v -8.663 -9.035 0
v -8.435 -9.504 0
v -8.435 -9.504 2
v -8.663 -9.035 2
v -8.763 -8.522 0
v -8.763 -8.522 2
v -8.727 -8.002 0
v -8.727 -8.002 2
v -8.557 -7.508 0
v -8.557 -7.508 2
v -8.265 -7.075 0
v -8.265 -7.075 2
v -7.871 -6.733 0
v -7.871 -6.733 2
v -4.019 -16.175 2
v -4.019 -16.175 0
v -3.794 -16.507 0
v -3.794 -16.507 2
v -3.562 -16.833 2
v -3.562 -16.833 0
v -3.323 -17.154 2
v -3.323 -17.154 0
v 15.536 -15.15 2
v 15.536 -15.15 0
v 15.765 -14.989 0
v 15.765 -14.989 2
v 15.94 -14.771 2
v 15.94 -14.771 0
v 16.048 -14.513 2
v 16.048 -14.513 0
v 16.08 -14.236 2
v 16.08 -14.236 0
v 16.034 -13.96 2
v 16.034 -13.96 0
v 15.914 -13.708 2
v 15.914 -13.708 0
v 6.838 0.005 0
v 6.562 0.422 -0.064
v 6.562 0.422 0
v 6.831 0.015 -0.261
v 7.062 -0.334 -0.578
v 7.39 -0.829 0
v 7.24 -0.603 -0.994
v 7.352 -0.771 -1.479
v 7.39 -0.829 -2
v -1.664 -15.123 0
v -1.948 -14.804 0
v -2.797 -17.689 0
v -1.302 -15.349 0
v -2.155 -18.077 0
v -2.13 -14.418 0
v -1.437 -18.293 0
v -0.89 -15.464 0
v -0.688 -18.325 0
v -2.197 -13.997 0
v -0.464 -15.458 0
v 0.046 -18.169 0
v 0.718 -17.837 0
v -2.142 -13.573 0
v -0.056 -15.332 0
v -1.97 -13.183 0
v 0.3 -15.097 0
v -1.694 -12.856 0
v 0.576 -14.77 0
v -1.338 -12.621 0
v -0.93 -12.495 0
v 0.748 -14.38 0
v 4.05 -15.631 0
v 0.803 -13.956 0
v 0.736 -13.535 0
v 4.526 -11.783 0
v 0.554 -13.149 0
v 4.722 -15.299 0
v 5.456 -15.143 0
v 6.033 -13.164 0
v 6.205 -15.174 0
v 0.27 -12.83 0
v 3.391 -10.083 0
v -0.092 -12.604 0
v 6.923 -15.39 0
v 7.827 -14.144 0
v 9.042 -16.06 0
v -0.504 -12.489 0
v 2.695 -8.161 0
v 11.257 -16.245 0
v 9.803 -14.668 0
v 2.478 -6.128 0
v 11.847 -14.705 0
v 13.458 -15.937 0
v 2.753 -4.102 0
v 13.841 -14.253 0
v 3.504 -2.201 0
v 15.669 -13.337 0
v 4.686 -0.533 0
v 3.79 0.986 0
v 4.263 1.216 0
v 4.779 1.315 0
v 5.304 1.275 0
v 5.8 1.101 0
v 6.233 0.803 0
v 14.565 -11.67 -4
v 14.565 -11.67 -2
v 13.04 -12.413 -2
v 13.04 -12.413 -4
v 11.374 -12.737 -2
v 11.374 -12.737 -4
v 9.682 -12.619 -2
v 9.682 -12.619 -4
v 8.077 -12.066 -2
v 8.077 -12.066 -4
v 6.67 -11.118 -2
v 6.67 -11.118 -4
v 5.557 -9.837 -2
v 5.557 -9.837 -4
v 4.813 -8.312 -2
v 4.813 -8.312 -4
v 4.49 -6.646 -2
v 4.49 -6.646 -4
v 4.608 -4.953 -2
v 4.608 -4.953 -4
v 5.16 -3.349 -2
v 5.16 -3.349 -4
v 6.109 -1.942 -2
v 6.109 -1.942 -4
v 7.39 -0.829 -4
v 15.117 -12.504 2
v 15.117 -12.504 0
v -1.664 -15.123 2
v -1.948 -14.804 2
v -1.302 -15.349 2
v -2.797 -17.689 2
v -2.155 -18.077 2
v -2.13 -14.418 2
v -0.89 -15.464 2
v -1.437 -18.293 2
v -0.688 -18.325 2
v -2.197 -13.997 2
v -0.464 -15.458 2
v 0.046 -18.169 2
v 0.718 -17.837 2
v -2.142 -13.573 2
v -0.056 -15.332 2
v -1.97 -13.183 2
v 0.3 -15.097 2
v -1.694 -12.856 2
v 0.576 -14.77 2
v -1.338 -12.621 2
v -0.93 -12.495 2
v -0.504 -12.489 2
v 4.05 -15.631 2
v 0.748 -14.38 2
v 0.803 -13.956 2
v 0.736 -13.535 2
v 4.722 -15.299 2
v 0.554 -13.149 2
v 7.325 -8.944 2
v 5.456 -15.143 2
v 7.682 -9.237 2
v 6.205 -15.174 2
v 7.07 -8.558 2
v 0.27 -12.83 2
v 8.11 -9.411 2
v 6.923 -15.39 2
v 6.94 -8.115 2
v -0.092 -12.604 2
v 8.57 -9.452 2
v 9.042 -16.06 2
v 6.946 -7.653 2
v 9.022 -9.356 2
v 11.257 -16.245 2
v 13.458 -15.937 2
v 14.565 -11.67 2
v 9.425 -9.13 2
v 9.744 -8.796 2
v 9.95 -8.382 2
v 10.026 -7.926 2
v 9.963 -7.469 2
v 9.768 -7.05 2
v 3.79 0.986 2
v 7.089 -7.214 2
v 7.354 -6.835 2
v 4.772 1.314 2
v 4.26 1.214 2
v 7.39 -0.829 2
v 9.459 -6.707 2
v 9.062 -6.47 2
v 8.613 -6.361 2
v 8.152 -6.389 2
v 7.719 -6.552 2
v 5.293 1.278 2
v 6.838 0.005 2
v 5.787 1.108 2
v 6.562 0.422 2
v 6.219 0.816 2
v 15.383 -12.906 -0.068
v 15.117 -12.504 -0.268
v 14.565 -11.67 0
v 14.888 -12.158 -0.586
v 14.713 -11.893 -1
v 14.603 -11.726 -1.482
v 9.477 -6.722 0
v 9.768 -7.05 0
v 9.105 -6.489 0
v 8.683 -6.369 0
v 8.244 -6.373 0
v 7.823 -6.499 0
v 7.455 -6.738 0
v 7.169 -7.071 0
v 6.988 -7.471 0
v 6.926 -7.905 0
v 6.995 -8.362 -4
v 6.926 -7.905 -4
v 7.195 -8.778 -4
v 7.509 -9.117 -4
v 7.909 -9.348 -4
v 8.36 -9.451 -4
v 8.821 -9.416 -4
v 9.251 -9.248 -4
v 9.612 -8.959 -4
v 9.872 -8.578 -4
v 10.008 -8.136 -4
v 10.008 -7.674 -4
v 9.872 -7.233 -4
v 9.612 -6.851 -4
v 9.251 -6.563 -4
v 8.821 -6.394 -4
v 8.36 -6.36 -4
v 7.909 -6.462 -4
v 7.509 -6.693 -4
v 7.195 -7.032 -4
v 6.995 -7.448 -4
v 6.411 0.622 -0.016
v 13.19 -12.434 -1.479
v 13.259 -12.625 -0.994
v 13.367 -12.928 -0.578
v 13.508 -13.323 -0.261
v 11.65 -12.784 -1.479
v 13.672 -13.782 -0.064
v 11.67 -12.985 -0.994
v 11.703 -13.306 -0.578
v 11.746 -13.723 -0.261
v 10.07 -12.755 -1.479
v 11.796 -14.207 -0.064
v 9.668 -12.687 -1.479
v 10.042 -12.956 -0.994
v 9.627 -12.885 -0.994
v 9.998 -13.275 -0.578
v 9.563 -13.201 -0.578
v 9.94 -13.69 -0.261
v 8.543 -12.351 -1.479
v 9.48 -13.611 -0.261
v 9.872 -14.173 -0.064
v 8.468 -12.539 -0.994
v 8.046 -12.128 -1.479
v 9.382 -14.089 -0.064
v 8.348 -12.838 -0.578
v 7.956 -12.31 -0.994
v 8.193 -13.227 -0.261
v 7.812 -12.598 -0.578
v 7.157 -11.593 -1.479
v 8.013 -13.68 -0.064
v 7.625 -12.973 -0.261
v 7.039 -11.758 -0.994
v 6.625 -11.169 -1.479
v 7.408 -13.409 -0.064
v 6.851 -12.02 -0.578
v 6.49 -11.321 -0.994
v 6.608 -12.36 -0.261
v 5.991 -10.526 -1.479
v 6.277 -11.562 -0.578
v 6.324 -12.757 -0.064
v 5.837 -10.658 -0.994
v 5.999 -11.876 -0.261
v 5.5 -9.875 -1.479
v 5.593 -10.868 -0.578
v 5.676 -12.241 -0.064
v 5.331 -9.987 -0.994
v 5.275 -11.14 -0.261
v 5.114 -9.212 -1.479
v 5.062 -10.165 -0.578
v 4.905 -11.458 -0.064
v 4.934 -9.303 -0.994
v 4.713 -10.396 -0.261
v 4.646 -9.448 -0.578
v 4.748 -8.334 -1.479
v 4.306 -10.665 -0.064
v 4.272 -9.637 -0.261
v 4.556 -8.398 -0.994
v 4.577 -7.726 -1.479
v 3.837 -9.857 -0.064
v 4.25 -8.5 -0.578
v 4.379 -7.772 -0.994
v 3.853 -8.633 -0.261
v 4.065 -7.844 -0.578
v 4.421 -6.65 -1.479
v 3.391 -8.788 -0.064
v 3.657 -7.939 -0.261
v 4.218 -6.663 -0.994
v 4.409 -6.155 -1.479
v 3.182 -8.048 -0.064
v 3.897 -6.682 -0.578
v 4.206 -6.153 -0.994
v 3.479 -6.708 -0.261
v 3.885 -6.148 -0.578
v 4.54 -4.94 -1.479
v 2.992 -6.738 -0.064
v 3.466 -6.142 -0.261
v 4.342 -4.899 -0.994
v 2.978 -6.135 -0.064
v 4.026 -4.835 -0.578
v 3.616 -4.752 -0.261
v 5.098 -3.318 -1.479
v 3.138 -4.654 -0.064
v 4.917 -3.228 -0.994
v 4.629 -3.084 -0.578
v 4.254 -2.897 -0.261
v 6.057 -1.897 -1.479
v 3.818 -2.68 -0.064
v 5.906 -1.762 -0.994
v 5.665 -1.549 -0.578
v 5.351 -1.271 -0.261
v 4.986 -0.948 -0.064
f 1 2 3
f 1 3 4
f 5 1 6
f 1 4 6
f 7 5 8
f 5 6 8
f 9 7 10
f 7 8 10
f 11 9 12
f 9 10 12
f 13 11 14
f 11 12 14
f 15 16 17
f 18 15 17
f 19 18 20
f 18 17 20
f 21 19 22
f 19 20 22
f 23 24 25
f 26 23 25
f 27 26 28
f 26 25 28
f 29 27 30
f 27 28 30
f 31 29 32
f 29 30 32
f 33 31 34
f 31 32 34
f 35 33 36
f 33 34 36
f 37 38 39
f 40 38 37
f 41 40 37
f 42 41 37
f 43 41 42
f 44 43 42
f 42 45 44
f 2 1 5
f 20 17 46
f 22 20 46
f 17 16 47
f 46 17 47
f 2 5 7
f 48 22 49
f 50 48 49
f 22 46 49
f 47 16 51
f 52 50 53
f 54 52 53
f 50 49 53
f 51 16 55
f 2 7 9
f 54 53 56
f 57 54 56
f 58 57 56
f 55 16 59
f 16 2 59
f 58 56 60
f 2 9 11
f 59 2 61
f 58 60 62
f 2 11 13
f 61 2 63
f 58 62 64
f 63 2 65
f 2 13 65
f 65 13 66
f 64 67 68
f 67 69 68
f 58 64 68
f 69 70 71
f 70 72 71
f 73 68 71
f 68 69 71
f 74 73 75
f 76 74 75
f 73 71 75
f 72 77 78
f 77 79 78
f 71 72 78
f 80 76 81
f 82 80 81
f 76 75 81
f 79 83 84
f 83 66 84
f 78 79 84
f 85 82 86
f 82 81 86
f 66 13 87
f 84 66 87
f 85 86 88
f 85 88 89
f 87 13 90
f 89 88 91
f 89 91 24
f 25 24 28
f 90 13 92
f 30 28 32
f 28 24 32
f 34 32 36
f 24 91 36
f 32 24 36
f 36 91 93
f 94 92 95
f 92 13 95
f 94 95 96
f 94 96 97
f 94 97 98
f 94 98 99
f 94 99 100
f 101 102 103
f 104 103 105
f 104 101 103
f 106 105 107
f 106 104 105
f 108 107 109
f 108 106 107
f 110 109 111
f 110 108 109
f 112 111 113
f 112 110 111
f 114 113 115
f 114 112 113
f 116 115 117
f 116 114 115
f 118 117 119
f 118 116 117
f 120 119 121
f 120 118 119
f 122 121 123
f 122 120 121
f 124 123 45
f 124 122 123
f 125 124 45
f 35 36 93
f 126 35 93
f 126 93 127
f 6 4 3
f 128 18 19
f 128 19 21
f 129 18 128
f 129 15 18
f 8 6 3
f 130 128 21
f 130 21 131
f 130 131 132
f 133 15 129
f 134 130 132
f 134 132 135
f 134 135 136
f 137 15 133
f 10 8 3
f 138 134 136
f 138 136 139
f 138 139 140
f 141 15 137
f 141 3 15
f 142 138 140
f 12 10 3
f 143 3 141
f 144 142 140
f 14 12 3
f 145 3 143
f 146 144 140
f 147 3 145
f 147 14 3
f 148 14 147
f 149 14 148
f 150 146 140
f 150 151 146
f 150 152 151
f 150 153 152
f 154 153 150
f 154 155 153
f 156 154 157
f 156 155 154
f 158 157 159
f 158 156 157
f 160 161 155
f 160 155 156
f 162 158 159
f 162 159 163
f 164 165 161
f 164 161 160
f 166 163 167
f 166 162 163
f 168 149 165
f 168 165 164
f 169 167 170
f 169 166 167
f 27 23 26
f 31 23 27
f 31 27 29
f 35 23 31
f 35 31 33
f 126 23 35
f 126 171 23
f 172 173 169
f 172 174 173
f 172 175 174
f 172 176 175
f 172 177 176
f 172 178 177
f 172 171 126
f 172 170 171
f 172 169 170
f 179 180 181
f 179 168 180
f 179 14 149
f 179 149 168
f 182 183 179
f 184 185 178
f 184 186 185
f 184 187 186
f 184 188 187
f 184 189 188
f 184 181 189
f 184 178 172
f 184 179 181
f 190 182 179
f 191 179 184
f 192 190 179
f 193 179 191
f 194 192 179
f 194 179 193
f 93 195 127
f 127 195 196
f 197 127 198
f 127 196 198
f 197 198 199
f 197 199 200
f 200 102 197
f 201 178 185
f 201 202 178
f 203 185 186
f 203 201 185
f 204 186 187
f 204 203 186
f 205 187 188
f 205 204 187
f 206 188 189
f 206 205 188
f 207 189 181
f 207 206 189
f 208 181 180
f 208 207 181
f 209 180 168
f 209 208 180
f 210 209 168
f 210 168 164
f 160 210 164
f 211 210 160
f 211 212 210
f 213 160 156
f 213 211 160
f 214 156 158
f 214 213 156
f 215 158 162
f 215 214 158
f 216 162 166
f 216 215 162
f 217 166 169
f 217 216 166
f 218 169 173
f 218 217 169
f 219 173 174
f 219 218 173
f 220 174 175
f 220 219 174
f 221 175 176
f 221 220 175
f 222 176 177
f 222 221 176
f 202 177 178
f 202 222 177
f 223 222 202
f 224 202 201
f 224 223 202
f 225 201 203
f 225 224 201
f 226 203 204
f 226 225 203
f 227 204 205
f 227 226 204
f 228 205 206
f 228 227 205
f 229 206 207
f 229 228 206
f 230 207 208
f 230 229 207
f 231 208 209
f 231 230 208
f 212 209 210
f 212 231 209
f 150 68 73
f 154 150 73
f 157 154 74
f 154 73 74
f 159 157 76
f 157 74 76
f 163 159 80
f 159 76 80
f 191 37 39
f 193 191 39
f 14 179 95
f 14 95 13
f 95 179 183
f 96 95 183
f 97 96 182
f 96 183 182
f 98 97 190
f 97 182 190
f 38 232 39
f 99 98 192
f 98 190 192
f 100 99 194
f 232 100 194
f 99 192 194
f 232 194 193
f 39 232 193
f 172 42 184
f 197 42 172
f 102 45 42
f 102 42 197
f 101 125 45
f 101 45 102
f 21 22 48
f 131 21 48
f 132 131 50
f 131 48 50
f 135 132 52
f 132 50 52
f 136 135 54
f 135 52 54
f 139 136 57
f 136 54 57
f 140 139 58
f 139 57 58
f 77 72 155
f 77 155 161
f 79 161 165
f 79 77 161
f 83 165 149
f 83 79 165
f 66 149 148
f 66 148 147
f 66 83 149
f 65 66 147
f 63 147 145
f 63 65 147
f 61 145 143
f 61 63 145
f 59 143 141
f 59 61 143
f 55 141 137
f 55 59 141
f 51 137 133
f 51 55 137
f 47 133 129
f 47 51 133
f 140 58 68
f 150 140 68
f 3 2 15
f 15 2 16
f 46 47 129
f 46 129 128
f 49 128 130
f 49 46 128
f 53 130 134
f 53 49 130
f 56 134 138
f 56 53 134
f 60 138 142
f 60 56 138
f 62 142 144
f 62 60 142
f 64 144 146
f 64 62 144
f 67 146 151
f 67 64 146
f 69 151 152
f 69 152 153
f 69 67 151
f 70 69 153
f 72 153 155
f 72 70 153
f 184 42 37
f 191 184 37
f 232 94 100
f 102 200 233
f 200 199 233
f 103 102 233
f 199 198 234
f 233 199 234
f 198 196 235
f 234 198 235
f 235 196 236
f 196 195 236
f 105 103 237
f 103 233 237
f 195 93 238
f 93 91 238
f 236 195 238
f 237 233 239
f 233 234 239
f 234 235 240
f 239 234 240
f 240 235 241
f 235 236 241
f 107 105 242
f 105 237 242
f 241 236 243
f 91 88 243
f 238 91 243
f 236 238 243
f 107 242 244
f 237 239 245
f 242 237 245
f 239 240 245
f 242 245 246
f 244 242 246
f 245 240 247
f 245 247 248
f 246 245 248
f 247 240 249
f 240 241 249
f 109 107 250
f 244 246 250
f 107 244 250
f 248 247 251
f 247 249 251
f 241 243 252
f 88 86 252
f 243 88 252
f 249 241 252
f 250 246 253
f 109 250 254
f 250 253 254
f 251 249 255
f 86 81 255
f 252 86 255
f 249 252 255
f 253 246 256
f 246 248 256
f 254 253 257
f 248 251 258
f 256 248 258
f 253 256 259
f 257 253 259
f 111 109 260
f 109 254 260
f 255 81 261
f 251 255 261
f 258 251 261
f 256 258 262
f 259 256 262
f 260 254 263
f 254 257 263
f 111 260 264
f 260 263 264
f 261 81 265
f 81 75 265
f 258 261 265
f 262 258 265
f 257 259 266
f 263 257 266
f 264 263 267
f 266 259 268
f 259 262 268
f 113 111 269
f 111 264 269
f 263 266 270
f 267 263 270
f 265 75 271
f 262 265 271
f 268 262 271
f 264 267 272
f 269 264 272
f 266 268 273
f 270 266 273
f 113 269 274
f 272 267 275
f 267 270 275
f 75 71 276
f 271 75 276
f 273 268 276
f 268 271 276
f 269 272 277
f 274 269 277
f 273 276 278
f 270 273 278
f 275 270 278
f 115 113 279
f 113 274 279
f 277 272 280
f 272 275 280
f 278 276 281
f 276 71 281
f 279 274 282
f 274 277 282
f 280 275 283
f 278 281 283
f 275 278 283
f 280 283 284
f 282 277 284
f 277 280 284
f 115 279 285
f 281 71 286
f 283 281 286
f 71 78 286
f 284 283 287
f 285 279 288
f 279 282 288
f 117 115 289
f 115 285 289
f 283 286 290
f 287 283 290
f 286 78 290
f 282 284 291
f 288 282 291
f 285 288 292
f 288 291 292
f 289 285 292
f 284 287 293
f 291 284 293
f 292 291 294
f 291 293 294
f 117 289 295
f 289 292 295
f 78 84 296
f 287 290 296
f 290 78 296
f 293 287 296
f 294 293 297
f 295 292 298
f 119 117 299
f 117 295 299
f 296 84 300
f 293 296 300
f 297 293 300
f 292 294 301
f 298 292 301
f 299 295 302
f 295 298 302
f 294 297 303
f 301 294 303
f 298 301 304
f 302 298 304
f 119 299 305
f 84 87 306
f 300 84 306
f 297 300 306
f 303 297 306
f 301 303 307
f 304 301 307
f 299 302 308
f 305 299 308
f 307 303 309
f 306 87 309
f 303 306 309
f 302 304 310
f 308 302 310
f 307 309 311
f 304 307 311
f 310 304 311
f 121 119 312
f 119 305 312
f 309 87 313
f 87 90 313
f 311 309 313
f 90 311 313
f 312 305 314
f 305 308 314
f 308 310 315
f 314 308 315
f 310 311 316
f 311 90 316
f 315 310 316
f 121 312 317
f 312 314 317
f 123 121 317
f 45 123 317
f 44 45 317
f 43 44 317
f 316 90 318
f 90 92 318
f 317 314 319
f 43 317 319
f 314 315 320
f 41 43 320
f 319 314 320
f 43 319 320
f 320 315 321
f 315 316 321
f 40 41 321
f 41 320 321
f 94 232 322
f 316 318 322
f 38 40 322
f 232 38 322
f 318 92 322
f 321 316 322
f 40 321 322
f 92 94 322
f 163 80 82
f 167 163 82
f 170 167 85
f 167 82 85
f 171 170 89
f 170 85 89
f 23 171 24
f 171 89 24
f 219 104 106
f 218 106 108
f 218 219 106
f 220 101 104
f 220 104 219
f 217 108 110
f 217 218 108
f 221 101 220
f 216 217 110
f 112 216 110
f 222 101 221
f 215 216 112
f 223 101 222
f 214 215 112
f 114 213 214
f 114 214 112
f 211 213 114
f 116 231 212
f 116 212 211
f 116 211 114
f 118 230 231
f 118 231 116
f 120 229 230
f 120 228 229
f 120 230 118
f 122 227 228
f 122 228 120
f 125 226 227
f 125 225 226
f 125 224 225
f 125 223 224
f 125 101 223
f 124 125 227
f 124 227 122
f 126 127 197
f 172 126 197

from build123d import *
from build123d.topology import SkipClean

# Parameters (mm, degrees)
EXTRUDE_1_DEPTH     = 2
EXTRUDE_START       = 4
SKETCH_3_R          = 1.55
EXTRUDE_2_DEPTH     = 4
FILLET_1_R          = 2
CUT_EXTRUDE_1_DEPTH = 10
FILLET_2_R          = 2


with BuildPart() as part:
    # 草图2 → 凸台-拉伸1 (new body)
    with BuildSketch(Plane.XY):
        with BuildLine():
            Line((14.564994601, -11.669618141), (7.389813792, -0.829102454))
            Line((7.389813792, -0.829102454), (6.837876806, 0.004783368))
            Line((6.837876806, 0.004783368), (4.07819188, 4.174212479))
            Line((4.07819188, 4.174212479), (3.526254895, 5.008098301))
            Line((3.526254895, 5.008098301), (-3.648925914, 15.848613988))
            Line((-3.648925914, 15.848613988), (-4.2008629, 16.68249981))
            Line((-4.2008629, 16.68249981), (-4.998009984, 17.886857679))
            ThreePointArc((-4.998009984, 17.886857679), (-5.687361464, 18.324420478), (-6.473069172, 18.102316754))
            ThreePointArc((-6.473069172, 18.102316754), (-9.153711125, 14.591132343), (-10.06004351, 10.267613076))
            ThreePointArc((-10.06004351, 10.267613076), (-10.405656258, 8.820717267), (-11.403844954, 7.717732689))
            Line((-11.403844954, 7.717732689), (-14.736003804, 5.512224858))
            ThreePointArc((-14.736003804, 5.512224858), (-15.998358454, 3.706490878), (-15.686779581, 1.525405581))
            ThreePointArc((-15.686779581, 1.525405581), (-15.380816242, 1.008667124), (-15.057770631, 0.502432268))
            Line((-15.057770631, 0.502432268), (-4.019030925, -16.175284173))
            ThreePointArc((-4.019030925, -16.175284173), (-3.679263259, -16.670450943), (-3.323152402, -17.153997481))
            ThreePointArc((-3.323152402, -17.153997481), (-1.437196365, -18.293025266), (0.718231785, -17.83657816))
            Line((0.718231785, -17.83657816), (4.050390635, -15.631070329))
            ThreePointArc((4.050390635, -15.631070329), (5.455716688, -15.143203199), (6.922632961, -15.390412219))
            ThreePointArc((6.922632961, -15.390412219), (11.256585707, -16.245462422), (15.536058254, -15.149847541))
            ThreePointArc((15.536058254, -15.149847541), (16.047506269, -14.513382621), (15.91407867, -13.707861832))
            Line((15.91407867, -13.707861832), (15.116931586, -12.503503963))
            Line((15.116931586, -12.503503963), (14.564994601, -11.669618141))
        make_face()
        with BuildLine():
            ThreePointArc((-1.270469952, 9.628047515), (-3.418495303, 10.065068212), (-3.855516, 7.917042861))
            ThreePointArc((-3.855516, 7.917042861), (-1.707490649, 7.480022164), (-1.270469952, 9.628047515))
        make_face(mode=Mode.SUBTRACT)
        with BuildLine():
            ThreePointArc((7.183223706, -8.76067358), (9.331249057, -9.197694277), (9.768269754, -7.049668926))
            ThreePointArc((9.768269754, -7.049668926), (7.620244403, -6.612648229), (7.183223706, -8.76067358))
        make_face(mode=Mode.SUBTRACT)
        with BuildLine():
            ThreePointArc((-1.947826046, -14.804383569), (0.130908165, -15.227306825), (0.55383142, -13.148572614))
            ThreePointArc((0.55383142, -13.148572614), (-1.524902791, -12.725649358), (-1.947826046, -14.804383569))
        make_face(mode=Mode.SUBTRACT)
        with BuildLine():
            ThreePointArc((-10.484908286, 3.529143828), (-12.563642497, 3.952067083), (-12.986565752, 1.873332872))
            ThreePointArc((-12.986565752, 1.873332872), (-10.907831541, 1.450409617), (-10.484908286, 3.529143828))
        make_face(mode=Mode.SUBTRACT)
    extrude(amount=EXTRUDE_1_DEPTH)

    # 草图3 → 凸台-拉伸2 (add)
    # profile 1 of 2: a face of its own
    with SkipClean():  # the faces are left unmerged after this step: merging them gives an invalid solid
        with BuildSketch(Plane(origin=(0, 0, 0), x_dir=(-1, 0, 0), z_dir=(0, 0, -1)).offset(EXTRUDE_START)):
            with BuildLine():
                ThreePointArc((-3.526254895, 5.008098301), (5.481593353, 6.84076574), (3.648925914, 15.848613988))
                Line((3.648925914, 15.848613988), (-3.526254895, 5.008098301))
            make_face()
            with Locations((2.562992976, 8.772545188)):
                Circle(SKETCH_3_R, mode=Mode.SUBTRACT)
        # profile 2 of 2: a face of its own
        with BuildSketch(Plane(origin=(0, 0, 0), x_dir=(-1, 0, 0), z_dir=(0, 0, -1)).offset(EXTRUDE_START)):
            with BuildLine():
                ThreePointArc((-14.564994601, -11.669618141), (-5.557146353, -9.836950702), (-7.389813792, -0.829102454))
                Line((-7.389813792, -0.829102454), (-14.564994601, -11.669618141))
            make_face()
            with Locations((-8.47574673, -7.905171253)):
                Circle(SKETCH_3_R, mode=Mode.SUBTRACT)
        extrude(amount=-EXTRUDE_2_DEPTH)

    # 圆角1
    # the kernel refuses this fillet: 2 mm, written as the material it adds along each edge
    with BuildSketch(Plane(origin=(10.977404196, -6.249360297, 0), x_dir=(0.5519369853128372, -0.8338858220666526, 0), z_dir=(0.8338858220666526, 0.5519369853128372, 0))) as fillet_1_piece_1:
        with BuildLine():
            CenterArc((6.5 + FILLET_1_R, FILLET_1_R), FILLET_1_R, 180, 90)
            Line((6.5, FILLET_1_R), (6.5, 0))
            Line((6.5, 0), (6.5 + FILLET_1_R, 0))
        make_face()
    revolve(axis=Axis((10.977404196, -6.249360297, 0), (0, 0, -1)), revolution_arc=180)
    with BuildSketch(Plane(origin=(-0.06133551, 10.428356144, 0), x_dir=(0.5519369853122391, -0.8338858220670484, 0), z_dir=(0.8338858220670484, 0.5519369853122391, 0))) as fillet_1_piece_2:
        with BuildLine():
            CenterArc((6.5 + FILLET_1_R, FILLET_1_R), FILLET_1_R, 180, 90)
            Line((6.5, FILLET_1_R), (6.5, 0))
            Line((6.5, 0), (6.5 + FILLET_1_R, 0))
        make_face()
    revolve(axis=Axis((-0.06133551, 10.428356144, 0), (0, 0, -1)), revolution_arc=180)

    # 草图4 → 切除-拉伸1 (cut)
    with BuildSketch(Plane.XY.offset(2)):
        Polygon((5.458034343, 2.089497924), (-9.538400778, -7.836425953), (-26.545257477, 2.73324315), (-0.393587014, 27.879080134), align=None)
    extrude(amount=-CUT_EXTRUDE_1_DEPTH, mode=Mode.SUBTRACT)

    # 圆角2
    # the kernel refuses this fillet: 2 mm, written as the material it takes off along each edge
    with BuildSketch(Plane(origin=(5.458034343, 2.089497924, 7), x_dir=(-0.8338858220669847, -0.5519369853123355, 0), z_dir=(0, 0, -1))) as fillet_2_piece_1:
        with BuildLine():
            CenterArc((FILLET_2_R, -FILLET_2_R), FILLET_2_R, 90, 90)
            Line((0, -FILLET_2_R), (0, 0))
            Line((0, 0), (FILLET_2_R, 0))
        make_face()
    extrude(amount=12, mode=Mode.SUBTRACT)
    with BuildSketch(Plane(origin=(-9.538400778, -7.836425953, 7), x_dir=(0.8338858220669851, 0.5519369853123349, 0), z_dir=(0, 0, -1))) as fillet_2_piece_2:
        with BuildLine():
            CenterArc((FILLET_2_R, FILLET_2_R), FILLET_2_R, 180, 90)
            Line((0, FILLET_2_R), (0, 0))
            Line((0, 0), (FILLET_2_R, 0))
        make_face()
    extrude(amount=12, mode=Mode.SUBTRACT)


solid = part.part
